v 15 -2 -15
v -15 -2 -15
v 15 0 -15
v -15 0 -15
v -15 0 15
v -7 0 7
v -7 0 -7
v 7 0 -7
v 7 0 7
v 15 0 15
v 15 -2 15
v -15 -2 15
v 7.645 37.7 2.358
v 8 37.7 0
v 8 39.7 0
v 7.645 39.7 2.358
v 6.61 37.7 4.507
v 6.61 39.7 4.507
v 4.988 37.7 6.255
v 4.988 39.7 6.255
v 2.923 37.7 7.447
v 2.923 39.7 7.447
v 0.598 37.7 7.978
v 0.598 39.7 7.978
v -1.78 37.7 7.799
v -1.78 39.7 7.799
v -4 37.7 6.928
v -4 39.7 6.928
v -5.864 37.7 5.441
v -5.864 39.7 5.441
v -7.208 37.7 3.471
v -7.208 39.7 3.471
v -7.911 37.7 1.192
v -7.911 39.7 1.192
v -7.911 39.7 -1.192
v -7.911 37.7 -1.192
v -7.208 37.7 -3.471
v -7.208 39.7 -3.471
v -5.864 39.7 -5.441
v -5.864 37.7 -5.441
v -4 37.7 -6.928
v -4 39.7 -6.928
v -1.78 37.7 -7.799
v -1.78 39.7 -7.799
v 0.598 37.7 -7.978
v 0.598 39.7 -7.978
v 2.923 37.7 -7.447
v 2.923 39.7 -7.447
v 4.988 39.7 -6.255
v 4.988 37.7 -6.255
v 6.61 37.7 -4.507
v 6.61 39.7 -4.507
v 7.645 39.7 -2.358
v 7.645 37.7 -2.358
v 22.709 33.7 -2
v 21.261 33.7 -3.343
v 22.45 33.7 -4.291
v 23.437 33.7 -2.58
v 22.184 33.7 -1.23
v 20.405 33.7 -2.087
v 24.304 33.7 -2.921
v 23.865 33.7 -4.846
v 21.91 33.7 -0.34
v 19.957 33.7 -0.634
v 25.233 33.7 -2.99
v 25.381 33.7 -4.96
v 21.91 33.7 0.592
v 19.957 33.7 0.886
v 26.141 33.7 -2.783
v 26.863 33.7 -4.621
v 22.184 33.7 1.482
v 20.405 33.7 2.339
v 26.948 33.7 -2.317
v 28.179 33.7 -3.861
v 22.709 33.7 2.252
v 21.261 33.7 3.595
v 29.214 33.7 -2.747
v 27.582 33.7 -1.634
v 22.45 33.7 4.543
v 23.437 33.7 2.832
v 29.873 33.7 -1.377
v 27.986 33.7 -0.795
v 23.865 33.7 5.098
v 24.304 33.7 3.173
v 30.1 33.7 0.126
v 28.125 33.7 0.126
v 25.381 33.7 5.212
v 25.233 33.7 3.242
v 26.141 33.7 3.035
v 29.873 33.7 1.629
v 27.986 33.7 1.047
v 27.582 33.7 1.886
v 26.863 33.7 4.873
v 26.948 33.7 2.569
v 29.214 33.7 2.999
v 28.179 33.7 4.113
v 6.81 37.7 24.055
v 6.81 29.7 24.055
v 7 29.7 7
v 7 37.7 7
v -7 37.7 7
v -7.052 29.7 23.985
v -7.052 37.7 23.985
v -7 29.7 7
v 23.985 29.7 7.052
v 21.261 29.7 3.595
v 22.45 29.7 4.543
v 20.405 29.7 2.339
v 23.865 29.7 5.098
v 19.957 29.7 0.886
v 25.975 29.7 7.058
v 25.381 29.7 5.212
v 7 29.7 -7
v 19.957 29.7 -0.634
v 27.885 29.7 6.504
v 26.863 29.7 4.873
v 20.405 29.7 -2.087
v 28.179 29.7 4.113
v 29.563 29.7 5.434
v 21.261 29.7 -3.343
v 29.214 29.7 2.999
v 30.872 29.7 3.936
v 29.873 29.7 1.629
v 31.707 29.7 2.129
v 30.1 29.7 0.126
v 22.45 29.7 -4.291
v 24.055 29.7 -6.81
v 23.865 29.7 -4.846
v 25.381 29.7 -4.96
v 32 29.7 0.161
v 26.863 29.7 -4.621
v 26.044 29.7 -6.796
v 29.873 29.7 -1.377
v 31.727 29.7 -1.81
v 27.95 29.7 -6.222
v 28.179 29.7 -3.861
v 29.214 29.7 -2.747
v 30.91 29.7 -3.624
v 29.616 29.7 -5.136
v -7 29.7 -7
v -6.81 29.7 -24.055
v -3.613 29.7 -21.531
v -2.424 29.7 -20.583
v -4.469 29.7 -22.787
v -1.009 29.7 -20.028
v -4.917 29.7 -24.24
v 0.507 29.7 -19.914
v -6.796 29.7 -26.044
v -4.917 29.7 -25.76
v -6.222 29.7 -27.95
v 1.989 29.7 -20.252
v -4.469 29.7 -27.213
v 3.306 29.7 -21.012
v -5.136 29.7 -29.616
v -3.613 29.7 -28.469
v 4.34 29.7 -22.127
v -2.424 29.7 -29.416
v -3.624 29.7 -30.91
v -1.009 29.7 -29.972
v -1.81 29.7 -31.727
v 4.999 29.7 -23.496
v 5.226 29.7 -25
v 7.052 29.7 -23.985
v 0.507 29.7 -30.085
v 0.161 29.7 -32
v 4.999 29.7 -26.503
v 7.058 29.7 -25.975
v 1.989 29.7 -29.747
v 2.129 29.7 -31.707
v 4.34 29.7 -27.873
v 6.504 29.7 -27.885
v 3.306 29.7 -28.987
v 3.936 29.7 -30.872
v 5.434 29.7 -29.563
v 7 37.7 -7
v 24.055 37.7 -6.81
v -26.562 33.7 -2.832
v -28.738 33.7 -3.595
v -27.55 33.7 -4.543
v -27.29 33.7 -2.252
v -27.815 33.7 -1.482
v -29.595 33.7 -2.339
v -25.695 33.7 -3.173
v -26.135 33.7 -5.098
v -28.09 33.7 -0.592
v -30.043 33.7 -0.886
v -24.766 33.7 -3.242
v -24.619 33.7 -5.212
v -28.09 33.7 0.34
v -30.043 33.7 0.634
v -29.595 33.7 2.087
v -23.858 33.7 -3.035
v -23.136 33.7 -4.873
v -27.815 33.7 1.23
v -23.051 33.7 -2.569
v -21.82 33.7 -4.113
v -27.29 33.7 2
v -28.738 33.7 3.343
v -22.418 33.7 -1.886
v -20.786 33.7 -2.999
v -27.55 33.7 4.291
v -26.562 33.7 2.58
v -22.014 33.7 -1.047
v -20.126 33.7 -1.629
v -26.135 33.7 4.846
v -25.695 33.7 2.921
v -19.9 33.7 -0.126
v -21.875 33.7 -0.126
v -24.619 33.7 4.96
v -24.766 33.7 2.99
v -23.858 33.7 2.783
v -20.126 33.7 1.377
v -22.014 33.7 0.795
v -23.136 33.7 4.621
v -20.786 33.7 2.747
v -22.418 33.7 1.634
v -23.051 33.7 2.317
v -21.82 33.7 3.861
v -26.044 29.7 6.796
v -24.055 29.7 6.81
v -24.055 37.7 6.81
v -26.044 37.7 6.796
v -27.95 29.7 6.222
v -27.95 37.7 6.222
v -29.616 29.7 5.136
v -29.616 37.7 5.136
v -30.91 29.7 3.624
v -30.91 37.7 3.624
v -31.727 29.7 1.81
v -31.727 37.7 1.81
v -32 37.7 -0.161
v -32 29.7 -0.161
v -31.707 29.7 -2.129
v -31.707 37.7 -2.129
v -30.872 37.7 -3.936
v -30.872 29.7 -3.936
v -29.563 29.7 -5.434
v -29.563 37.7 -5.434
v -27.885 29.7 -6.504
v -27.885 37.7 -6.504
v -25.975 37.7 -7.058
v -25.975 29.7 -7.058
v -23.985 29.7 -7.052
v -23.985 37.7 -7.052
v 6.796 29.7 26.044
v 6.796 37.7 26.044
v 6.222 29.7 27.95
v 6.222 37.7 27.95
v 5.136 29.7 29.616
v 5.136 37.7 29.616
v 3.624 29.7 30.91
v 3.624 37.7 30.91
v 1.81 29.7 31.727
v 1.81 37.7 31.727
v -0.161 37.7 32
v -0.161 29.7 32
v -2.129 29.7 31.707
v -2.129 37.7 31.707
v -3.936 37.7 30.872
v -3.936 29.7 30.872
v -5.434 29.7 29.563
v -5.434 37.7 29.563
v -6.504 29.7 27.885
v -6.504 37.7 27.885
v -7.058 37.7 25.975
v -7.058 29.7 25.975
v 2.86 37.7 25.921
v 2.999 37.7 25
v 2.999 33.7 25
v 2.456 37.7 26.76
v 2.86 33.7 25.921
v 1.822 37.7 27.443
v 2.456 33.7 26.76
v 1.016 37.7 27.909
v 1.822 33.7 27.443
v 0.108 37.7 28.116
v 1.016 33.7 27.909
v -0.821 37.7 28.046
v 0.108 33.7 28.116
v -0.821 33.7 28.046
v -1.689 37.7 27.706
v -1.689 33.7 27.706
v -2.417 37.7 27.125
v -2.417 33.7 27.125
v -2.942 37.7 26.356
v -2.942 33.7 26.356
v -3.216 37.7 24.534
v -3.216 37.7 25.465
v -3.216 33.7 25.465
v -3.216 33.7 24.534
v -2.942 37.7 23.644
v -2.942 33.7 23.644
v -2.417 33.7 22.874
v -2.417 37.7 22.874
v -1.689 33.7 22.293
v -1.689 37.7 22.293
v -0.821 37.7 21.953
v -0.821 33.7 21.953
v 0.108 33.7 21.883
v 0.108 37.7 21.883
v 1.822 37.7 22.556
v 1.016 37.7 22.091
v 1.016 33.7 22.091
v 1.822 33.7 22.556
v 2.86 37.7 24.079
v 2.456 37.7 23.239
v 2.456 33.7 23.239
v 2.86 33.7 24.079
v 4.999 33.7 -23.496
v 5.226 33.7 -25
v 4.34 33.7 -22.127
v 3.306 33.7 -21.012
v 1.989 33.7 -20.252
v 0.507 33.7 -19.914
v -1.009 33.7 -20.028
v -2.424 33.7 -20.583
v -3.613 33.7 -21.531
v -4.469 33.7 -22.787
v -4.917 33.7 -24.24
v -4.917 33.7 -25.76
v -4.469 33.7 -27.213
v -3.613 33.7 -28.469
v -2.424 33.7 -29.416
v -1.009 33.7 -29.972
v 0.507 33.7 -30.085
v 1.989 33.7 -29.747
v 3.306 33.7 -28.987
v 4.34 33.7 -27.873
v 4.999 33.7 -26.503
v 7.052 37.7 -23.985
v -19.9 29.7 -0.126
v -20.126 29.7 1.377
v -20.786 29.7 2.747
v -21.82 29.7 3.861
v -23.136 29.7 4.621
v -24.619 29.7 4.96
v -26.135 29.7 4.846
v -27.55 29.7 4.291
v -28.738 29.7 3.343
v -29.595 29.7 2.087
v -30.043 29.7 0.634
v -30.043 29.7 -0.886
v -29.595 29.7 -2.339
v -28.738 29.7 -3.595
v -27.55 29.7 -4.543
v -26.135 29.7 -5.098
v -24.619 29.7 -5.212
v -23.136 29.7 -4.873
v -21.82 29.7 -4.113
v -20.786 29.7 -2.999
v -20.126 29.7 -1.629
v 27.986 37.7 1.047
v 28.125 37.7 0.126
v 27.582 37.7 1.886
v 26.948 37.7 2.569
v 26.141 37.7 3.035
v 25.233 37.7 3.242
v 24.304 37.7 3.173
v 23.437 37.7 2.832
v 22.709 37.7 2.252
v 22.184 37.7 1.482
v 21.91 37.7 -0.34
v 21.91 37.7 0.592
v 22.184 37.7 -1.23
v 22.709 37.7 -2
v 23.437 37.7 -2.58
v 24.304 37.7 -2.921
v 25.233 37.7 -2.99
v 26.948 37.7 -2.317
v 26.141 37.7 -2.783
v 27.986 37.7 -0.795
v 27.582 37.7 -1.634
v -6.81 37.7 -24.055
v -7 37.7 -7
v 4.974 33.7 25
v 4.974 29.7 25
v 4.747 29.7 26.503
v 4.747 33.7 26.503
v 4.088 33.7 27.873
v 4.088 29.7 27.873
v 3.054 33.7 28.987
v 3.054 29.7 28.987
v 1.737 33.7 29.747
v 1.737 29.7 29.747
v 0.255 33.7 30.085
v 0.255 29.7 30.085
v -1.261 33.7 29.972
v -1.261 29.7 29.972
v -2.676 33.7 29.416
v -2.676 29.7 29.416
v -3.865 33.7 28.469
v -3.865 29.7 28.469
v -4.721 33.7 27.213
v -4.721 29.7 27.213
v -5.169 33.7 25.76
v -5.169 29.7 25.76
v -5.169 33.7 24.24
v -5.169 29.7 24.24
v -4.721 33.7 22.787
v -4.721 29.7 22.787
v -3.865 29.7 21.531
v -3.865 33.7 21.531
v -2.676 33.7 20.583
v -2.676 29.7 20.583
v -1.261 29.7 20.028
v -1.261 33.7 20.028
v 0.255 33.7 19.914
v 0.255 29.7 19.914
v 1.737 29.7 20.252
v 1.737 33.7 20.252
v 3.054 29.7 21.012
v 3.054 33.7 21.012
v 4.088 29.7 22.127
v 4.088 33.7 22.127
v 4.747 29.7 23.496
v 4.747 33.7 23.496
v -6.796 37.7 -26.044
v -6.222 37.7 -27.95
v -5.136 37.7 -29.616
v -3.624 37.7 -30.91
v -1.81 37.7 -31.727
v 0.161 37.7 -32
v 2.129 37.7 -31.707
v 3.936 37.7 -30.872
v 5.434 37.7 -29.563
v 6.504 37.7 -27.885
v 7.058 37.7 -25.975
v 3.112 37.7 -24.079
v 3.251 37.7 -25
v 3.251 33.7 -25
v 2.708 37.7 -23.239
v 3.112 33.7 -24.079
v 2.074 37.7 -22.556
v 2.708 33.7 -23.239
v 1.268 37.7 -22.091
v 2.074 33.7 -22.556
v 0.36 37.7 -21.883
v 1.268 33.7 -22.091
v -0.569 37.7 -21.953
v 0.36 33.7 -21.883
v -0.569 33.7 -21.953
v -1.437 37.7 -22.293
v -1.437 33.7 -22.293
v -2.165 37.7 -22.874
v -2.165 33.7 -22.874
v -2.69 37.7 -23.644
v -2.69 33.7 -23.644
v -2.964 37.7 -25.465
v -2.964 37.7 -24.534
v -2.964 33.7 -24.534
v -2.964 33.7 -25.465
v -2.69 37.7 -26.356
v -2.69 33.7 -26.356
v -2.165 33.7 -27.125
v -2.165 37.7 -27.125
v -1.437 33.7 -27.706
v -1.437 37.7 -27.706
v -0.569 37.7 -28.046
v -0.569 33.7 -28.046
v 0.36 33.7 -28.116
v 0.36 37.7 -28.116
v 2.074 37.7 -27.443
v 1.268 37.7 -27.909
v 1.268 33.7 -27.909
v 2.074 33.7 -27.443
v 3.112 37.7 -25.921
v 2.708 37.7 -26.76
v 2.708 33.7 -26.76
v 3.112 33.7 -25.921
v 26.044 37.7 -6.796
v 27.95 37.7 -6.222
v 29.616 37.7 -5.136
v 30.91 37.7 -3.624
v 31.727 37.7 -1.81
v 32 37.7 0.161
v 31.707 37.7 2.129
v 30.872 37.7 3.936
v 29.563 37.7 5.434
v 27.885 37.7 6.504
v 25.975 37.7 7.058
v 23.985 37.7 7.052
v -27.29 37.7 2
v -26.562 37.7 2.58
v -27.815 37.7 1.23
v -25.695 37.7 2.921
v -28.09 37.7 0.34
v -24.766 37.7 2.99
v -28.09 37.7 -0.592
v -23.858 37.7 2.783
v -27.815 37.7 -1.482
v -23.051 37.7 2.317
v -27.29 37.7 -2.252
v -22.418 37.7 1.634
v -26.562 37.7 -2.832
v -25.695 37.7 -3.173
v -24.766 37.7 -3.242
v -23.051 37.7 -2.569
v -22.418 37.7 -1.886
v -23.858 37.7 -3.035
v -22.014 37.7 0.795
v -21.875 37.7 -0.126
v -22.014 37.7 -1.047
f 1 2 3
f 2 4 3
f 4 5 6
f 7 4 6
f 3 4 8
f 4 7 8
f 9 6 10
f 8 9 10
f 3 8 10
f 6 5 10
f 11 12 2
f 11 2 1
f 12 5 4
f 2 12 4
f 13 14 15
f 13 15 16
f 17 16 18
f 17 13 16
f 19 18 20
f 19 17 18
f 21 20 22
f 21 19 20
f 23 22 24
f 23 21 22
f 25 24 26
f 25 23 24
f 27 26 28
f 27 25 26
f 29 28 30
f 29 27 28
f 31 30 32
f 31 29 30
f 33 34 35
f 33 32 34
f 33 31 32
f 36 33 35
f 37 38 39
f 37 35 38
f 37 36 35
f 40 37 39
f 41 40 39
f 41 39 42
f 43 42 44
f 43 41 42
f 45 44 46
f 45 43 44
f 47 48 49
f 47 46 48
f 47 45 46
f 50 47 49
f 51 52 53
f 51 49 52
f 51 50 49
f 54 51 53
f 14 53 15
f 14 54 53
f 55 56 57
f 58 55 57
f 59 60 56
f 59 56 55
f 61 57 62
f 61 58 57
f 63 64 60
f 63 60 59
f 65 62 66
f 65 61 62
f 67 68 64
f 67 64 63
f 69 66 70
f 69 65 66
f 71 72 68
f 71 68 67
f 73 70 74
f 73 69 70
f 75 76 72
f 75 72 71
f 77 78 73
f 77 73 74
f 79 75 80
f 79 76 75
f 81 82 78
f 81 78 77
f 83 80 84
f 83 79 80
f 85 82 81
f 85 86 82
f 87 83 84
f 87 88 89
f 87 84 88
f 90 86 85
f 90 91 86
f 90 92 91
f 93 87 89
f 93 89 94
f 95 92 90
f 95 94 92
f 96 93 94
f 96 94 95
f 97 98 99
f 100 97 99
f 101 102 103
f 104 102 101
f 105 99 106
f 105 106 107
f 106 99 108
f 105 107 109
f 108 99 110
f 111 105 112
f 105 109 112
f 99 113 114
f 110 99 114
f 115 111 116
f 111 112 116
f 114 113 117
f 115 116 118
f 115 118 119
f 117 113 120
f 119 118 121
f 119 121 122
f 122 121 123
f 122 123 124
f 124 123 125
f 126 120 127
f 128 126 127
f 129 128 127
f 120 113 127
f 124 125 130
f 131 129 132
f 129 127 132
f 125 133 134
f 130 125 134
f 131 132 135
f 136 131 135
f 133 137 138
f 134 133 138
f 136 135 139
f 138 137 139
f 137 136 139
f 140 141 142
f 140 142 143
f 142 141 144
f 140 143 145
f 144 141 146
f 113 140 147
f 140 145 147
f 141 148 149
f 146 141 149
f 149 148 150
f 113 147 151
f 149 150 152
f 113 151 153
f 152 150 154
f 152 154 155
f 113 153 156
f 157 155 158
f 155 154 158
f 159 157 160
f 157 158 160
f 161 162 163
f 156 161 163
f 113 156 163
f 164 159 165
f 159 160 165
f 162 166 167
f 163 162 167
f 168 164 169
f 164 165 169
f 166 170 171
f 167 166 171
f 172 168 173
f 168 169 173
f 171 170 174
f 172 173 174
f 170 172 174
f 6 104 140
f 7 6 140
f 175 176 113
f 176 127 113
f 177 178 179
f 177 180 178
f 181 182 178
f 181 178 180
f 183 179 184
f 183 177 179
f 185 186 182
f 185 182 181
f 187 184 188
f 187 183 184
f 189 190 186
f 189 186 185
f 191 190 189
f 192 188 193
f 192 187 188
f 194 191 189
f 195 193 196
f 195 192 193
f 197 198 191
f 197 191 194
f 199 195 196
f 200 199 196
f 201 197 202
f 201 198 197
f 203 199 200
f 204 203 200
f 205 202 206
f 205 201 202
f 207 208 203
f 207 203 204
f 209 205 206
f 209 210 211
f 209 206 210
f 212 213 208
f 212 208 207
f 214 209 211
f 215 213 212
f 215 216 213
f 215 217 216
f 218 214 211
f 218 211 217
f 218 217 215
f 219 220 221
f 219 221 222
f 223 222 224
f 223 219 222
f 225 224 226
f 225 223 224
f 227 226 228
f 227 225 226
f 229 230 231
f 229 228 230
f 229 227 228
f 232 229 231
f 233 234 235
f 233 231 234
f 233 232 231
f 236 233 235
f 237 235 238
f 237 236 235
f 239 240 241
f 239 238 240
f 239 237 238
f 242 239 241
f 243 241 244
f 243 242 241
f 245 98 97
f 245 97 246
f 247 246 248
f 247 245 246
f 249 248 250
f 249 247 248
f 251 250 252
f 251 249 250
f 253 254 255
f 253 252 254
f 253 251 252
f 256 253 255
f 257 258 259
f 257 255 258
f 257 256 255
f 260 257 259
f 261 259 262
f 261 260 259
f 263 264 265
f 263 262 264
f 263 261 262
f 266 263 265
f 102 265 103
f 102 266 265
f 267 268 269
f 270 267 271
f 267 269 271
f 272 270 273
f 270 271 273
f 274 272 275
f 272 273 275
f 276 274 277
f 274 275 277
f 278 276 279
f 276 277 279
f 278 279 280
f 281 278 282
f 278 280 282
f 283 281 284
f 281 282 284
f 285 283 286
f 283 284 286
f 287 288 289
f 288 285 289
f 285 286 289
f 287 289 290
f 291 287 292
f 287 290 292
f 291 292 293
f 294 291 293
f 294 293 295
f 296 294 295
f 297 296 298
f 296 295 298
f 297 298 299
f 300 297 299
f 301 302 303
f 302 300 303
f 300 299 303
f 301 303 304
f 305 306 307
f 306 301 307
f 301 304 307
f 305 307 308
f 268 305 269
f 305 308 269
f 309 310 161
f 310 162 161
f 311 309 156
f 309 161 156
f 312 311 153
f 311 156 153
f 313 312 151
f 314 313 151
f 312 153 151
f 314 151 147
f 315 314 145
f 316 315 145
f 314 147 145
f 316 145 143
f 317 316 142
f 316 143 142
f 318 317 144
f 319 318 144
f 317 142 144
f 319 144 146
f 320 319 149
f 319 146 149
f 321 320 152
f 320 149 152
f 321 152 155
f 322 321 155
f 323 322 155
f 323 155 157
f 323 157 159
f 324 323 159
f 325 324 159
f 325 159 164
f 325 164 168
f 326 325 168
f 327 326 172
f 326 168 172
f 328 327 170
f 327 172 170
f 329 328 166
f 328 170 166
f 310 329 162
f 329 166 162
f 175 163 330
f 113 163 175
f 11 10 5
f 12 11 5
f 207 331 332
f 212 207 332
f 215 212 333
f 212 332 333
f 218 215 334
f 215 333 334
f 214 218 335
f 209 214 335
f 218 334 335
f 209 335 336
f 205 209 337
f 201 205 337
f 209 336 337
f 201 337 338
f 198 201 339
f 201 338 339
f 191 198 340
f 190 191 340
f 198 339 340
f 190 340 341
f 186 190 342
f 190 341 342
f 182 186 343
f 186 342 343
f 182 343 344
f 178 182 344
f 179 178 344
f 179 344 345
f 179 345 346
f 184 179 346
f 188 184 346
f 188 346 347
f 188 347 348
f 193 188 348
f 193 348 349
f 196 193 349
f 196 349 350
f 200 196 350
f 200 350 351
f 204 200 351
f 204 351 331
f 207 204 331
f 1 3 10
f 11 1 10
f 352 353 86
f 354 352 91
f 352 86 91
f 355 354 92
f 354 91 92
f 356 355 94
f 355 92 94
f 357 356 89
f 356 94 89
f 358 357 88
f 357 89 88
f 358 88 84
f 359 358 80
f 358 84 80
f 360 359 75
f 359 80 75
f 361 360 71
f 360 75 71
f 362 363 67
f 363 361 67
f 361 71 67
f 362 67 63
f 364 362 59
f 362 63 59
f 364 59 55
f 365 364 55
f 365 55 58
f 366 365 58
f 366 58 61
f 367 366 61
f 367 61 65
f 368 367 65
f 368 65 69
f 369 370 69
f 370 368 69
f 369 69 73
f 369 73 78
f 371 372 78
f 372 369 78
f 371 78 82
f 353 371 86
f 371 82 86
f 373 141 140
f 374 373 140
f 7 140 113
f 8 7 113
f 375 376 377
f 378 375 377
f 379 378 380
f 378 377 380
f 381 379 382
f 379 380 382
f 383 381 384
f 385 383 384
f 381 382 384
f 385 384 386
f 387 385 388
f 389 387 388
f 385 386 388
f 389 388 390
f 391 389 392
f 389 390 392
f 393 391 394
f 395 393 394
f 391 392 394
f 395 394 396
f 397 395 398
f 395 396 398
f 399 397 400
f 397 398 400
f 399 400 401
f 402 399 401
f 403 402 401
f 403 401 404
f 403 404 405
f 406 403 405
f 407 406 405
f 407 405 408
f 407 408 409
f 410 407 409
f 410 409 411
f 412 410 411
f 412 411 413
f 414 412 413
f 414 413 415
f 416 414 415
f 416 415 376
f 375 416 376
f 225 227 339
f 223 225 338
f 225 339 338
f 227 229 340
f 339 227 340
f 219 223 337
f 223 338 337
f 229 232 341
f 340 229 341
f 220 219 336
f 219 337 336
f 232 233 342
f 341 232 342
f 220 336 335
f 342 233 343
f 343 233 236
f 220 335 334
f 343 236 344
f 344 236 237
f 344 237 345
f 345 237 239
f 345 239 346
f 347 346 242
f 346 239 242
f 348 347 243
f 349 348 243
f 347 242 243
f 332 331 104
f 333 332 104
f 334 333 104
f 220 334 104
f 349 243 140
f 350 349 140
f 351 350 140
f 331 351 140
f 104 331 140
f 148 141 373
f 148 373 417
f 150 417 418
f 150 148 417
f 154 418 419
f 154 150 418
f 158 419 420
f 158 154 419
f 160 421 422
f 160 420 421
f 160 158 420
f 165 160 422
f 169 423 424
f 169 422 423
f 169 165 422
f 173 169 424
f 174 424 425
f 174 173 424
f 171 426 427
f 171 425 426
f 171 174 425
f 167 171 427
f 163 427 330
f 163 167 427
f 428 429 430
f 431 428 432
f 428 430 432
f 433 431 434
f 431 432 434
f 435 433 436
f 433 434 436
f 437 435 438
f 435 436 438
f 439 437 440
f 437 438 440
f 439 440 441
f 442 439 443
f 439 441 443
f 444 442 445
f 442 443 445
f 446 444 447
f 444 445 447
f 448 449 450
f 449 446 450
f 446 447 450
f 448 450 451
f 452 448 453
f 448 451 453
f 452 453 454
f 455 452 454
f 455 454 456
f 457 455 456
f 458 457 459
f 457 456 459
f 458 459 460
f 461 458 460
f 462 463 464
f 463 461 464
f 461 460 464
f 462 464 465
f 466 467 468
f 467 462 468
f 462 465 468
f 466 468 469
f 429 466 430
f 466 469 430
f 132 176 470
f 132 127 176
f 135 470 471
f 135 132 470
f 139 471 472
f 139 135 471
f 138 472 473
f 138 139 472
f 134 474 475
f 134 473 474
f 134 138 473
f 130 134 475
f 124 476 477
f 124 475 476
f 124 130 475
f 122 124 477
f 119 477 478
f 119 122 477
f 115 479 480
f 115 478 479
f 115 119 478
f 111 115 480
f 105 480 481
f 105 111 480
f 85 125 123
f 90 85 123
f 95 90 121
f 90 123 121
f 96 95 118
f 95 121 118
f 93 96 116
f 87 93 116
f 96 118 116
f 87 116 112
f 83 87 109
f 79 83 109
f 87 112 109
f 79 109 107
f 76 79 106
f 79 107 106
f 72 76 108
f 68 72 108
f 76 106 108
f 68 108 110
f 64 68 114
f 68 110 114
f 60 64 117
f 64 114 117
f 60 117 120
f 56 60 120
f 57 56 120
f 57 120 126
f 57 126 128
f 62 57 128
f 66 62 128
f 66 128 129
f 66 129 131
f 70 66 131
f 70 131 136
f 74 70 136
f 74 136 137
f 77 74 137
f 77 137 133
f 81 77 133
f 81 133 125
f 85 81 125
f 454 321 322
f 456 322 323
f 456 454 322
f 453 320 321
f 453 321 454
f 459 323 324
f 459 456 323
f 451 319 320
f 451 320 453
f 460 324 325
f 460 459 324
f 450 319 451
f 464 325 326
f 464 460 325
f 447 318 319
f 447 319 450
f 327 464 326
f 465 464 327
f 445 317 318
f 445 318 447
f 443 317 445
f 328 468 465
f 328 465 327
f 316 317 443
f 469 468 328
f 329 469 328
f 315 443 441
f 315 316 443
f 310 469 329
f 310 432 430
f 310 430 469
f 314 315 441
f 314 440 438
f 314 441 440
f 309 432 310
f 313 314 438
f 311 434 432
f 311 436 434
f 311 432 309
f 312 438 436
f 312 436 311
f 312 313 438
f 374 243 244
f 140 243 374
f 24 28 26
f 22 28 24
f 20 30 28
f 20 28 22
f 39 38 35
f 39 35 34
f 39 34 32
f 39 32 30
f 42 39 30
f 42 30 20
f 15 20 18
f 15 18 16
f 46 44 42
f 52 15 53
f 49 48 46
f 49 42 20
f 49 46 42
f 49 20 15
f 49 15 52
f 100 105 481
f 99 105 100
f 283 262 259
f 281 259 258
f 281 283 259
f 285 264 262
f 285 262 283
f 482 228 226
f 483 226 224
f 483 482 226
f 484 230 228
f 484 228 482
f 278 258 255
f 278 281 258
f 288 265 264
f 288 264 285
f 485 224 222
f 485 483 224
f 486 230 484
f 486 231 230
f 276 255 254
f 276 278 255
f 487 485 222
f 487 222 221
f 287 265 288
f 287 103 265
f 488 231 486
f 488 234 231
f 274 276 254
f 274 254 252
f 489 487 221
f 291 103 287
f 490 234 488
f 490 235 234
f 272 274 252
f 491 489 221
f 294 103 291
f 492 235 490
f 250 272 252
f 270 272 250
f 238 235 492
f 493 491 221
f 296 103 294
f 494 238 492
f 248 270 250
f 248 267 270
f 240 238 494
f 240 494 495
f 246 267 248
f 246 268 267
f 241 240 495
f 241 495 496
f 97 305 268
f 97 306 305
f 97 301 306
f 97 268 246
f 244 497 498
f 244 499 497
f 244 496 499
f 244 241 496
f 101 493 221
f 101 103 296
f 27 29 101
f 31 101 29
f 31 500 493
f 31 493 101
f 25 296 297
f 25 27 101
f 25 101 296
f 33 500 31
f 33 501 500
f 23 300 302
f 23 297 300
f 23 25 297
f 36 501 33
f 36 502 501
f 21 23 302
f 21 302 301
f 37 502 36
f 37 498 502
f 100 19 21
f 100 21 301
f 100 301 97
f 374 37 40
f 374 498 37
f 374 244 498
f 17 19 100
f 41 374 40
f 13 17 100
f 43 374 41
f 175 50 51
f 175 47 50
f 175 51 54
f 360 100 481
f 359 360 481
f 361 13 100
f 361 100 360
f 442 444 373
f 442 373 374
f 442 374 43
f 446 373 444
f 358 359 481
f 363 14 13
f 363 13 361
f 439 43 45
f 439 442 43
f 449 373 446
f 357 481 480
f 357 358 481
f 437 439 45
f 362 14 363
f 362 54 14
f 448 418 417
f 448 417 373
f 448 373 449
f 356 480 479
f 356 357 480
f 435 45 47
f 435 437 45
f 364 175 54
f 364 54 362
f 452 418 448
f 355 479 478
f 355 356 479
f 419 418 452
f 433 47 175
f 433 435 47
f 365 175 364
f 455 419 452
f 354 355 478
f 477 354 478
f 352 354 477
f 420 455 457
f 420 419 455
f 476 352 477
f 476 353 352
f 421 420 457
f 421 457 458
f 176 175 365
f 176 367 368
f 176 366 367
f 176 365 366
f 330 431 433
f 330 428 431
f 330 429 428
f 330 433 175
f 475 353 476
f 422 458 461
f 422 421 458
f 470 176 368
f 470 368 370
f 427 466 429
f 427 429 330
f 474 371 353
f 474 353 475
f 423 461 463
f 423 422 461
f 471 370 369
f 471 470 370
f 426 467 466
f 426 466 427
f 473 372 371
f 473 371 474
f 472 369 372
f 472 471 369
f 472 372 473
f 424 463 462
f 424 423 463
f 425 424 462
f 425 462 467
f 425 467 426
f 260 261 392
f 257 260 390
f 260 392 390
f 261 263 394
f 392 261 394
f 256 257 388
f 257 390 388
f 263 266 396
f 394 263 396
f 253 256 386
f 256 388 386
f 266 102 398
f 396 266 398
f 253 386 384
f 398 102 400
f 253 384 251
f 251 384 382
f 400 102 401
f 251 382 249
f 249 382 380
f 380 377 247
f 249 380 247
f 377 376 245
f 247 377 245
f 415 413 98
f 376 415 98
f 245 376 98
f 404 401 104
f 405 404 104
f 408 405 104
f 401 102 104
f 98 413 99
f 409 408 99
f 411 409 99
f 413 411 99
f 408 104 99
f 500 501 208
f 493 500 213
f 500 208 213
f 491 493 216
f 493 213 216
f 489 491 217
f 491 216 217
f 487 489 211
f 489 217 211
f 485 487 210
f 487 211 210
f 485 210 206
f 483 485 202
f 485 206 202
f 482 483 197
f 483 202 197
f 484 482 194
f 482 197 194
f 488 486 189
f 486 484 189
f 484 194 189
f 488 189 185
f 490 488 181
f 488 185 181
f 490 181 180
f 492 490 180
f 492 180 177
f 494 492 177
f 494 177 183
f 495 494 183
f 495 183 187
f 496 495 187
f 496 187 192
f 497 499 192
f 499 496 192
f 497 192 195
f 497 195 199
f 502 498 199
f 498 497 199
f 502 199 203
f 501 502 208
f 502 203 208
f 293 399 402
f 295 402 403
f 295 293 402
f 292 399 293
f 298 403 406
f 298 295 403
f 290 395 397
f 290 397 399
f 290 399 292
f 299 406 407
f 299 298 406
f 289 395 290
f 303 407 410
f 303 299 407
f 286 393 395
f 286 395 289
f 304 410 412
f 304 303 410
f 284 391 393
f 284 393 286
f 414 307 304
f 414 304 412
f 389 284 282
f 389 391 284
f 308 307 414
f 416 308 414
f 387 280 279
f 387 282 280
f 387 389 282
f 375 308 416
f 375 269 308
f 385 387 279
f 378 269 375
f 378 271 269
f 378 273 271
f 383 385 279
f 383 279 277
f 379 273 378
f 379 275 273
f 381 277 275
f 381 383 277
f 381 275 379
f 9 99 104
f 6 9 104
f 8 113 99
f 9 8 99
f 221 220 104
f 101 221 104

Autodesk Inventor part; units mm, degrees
ref_plane "YZ Plane" through (0, 0, 0) normal (1, 0, 0) x (0, 1, 0)
ref_plane "XZ Plane" through (0, 0, 0) normal (0, 1, 0) x (-1, 0, 0)
ref_plane "XY Plane" through (0, 0, 0) normal (0, 0, 1) x (1, 0, 0)
sketch "Sketch1" plane through (0, 0, 0) normal (0, 1, 0) x (-1, 0, 0)
  line L0 (5, 5) -> (-5, 5)
  line L1 (-5, 5) -> (-5, -5)
  line L2 (-5, -5) -> (5, -5)
  line L3 (5, -5) -> (5, 5)
  line L4 (5, 5) -> (-5, -5) construction
  line L5 (-5, 5) -> (5, -5) construction
  line L6 (-7, 7) -> (7, 7)
  line L7 (7, 7) -> (7, -7)
  line L8 (7, -7) -> (-7, -7)
  line L9 (-7, -7) -> (-7, 7)
  point P0 (0, 0)
  dimension "d0" = 10
  dimension "d1" = 10
  dimension "d4" = 2
extrude "Extrusion1" add sketch "Sketch1" along normal blind 29.7 contours L3 L2 L1 L0 | L6 L7 L8 L9
sketch "Sketch2" plane through (0, 29.7, 0) normal (0, 1, 0) x (1, 0, 0)
  circle A0 centre (0, 0) radius 25 construction
  circle A1 centre (0.126, 24.9997) radius 3.125
  arc A2 (7.0521, 23.9848) -> (-6.8099, 24.0546) centre (0.126, 24.9997) ccw
  line L0 (-7, 7) -> (-7, -7) projected
  line L1 (7, -7) -> (7, 7) projected
  line L2 (7, 7) -> (-7, 7) construction
  line L3 (-6.8099, 24.0546) -> (-7, 7)
  line L4 (7.0521, 23.9848) -> (7, 7)
  circle A3 centre (-24.9997, 0.126) radius 3.125
  arc A4 (-23.9848, 7.0521) -> (-24.0546, -6.8099) centre (-24.9997, 0.126) ccw
  line L5 (-23.9848, 7.0521) -> (-7, 7)
  line L6 (-24.0546, -6.8099) -> (-7, -7)
  circle A5 centre (-0.126, -24.9997) radius 3.125
  arc A6 (-7.0521, -23.9848) -> (6.8099, -24.0546) centre (-0.126, -24.9997) ccw
  line L7 (-7.0521, -23.9848) -> (-7, -7)
  line L8 (6.8099, -24.0546) -> (7, -7)
  circle A7 centre (24.9997, -0.126) radius 3.125
  arc A8 (23.9848, -7.0521) -> (24.0546, 6.8099) centre (24.9997, -0.126) ccw
  line L9 (23.9848, -7.0521) -> (7, -7)
  line L10 (24.0546, 6.8099) -> (7, 7)
  point P0 (7, 7)
  point P1 (-7, 7)
  point P2 (-7, -7)
  point P3 (7, -7)
  dimension "d5" = 50
  dimension "d6" = 6.25
  dimension "d10" = 360
  dimension "d28" = 7
extrude "Extrusion2" add sketch "Sketch2" along normal blind 8
sketch "Sketch3" plane through (0, 29.7, 0) normal (0, -1, 0) x (1, 0, 0)
  circle A0 centre (24.9997, 0.126) radius 3.125 projected
  circle A1 centre (24.9997, 0.126) radius 5.1
  circle A2 centre (-0.126, 24.9997) radius 5.1
  circle A3 centre (-24.9997, -0.126) radius 5.1
  circle A4 centre (0.126, -24.9997) radius 5.1
  point P0 (0, 0)
  dimension "d14" = 10.2
  dimension "d17" = 360
extrude "Extrusion3" cut sketch "Sketch3" against normal blind 4
sketch "Sketch6" plane through (0, 0, 0) normal (0, -1, 0) x (1, 0, 0)
  line L0 (-15, -15) -> (15, -15)
  line L1 (15, -15) -> (15, 15)
  line L2 (15, 15) -> (-15, 15)
  line L3 (-15, 15) -> (-15, -15)
  line L4 (-15, -15) -> (15, 15) construction
  line L5 (15, -15) -> (-15, 15) construction
  point P0 (0, 0)
  dimension "d32" = 30
  dimension "d33" = 30
extrude "Extrusion4" add sketch "Sketch6" along normal blind 2
sketch "Sketch7" plane through (0, 37.7, 0) normal (0, 1, 0) x (1, 0, 0)
  circle A0 centre (0, 0) radius 8
  dimension "d36" = 16
extrude "Extrusion5" add sketch "Sketch7" along normal blind 2
equation "\"d1\" = d0"
properties part number "franka_mount_3DPrint"
